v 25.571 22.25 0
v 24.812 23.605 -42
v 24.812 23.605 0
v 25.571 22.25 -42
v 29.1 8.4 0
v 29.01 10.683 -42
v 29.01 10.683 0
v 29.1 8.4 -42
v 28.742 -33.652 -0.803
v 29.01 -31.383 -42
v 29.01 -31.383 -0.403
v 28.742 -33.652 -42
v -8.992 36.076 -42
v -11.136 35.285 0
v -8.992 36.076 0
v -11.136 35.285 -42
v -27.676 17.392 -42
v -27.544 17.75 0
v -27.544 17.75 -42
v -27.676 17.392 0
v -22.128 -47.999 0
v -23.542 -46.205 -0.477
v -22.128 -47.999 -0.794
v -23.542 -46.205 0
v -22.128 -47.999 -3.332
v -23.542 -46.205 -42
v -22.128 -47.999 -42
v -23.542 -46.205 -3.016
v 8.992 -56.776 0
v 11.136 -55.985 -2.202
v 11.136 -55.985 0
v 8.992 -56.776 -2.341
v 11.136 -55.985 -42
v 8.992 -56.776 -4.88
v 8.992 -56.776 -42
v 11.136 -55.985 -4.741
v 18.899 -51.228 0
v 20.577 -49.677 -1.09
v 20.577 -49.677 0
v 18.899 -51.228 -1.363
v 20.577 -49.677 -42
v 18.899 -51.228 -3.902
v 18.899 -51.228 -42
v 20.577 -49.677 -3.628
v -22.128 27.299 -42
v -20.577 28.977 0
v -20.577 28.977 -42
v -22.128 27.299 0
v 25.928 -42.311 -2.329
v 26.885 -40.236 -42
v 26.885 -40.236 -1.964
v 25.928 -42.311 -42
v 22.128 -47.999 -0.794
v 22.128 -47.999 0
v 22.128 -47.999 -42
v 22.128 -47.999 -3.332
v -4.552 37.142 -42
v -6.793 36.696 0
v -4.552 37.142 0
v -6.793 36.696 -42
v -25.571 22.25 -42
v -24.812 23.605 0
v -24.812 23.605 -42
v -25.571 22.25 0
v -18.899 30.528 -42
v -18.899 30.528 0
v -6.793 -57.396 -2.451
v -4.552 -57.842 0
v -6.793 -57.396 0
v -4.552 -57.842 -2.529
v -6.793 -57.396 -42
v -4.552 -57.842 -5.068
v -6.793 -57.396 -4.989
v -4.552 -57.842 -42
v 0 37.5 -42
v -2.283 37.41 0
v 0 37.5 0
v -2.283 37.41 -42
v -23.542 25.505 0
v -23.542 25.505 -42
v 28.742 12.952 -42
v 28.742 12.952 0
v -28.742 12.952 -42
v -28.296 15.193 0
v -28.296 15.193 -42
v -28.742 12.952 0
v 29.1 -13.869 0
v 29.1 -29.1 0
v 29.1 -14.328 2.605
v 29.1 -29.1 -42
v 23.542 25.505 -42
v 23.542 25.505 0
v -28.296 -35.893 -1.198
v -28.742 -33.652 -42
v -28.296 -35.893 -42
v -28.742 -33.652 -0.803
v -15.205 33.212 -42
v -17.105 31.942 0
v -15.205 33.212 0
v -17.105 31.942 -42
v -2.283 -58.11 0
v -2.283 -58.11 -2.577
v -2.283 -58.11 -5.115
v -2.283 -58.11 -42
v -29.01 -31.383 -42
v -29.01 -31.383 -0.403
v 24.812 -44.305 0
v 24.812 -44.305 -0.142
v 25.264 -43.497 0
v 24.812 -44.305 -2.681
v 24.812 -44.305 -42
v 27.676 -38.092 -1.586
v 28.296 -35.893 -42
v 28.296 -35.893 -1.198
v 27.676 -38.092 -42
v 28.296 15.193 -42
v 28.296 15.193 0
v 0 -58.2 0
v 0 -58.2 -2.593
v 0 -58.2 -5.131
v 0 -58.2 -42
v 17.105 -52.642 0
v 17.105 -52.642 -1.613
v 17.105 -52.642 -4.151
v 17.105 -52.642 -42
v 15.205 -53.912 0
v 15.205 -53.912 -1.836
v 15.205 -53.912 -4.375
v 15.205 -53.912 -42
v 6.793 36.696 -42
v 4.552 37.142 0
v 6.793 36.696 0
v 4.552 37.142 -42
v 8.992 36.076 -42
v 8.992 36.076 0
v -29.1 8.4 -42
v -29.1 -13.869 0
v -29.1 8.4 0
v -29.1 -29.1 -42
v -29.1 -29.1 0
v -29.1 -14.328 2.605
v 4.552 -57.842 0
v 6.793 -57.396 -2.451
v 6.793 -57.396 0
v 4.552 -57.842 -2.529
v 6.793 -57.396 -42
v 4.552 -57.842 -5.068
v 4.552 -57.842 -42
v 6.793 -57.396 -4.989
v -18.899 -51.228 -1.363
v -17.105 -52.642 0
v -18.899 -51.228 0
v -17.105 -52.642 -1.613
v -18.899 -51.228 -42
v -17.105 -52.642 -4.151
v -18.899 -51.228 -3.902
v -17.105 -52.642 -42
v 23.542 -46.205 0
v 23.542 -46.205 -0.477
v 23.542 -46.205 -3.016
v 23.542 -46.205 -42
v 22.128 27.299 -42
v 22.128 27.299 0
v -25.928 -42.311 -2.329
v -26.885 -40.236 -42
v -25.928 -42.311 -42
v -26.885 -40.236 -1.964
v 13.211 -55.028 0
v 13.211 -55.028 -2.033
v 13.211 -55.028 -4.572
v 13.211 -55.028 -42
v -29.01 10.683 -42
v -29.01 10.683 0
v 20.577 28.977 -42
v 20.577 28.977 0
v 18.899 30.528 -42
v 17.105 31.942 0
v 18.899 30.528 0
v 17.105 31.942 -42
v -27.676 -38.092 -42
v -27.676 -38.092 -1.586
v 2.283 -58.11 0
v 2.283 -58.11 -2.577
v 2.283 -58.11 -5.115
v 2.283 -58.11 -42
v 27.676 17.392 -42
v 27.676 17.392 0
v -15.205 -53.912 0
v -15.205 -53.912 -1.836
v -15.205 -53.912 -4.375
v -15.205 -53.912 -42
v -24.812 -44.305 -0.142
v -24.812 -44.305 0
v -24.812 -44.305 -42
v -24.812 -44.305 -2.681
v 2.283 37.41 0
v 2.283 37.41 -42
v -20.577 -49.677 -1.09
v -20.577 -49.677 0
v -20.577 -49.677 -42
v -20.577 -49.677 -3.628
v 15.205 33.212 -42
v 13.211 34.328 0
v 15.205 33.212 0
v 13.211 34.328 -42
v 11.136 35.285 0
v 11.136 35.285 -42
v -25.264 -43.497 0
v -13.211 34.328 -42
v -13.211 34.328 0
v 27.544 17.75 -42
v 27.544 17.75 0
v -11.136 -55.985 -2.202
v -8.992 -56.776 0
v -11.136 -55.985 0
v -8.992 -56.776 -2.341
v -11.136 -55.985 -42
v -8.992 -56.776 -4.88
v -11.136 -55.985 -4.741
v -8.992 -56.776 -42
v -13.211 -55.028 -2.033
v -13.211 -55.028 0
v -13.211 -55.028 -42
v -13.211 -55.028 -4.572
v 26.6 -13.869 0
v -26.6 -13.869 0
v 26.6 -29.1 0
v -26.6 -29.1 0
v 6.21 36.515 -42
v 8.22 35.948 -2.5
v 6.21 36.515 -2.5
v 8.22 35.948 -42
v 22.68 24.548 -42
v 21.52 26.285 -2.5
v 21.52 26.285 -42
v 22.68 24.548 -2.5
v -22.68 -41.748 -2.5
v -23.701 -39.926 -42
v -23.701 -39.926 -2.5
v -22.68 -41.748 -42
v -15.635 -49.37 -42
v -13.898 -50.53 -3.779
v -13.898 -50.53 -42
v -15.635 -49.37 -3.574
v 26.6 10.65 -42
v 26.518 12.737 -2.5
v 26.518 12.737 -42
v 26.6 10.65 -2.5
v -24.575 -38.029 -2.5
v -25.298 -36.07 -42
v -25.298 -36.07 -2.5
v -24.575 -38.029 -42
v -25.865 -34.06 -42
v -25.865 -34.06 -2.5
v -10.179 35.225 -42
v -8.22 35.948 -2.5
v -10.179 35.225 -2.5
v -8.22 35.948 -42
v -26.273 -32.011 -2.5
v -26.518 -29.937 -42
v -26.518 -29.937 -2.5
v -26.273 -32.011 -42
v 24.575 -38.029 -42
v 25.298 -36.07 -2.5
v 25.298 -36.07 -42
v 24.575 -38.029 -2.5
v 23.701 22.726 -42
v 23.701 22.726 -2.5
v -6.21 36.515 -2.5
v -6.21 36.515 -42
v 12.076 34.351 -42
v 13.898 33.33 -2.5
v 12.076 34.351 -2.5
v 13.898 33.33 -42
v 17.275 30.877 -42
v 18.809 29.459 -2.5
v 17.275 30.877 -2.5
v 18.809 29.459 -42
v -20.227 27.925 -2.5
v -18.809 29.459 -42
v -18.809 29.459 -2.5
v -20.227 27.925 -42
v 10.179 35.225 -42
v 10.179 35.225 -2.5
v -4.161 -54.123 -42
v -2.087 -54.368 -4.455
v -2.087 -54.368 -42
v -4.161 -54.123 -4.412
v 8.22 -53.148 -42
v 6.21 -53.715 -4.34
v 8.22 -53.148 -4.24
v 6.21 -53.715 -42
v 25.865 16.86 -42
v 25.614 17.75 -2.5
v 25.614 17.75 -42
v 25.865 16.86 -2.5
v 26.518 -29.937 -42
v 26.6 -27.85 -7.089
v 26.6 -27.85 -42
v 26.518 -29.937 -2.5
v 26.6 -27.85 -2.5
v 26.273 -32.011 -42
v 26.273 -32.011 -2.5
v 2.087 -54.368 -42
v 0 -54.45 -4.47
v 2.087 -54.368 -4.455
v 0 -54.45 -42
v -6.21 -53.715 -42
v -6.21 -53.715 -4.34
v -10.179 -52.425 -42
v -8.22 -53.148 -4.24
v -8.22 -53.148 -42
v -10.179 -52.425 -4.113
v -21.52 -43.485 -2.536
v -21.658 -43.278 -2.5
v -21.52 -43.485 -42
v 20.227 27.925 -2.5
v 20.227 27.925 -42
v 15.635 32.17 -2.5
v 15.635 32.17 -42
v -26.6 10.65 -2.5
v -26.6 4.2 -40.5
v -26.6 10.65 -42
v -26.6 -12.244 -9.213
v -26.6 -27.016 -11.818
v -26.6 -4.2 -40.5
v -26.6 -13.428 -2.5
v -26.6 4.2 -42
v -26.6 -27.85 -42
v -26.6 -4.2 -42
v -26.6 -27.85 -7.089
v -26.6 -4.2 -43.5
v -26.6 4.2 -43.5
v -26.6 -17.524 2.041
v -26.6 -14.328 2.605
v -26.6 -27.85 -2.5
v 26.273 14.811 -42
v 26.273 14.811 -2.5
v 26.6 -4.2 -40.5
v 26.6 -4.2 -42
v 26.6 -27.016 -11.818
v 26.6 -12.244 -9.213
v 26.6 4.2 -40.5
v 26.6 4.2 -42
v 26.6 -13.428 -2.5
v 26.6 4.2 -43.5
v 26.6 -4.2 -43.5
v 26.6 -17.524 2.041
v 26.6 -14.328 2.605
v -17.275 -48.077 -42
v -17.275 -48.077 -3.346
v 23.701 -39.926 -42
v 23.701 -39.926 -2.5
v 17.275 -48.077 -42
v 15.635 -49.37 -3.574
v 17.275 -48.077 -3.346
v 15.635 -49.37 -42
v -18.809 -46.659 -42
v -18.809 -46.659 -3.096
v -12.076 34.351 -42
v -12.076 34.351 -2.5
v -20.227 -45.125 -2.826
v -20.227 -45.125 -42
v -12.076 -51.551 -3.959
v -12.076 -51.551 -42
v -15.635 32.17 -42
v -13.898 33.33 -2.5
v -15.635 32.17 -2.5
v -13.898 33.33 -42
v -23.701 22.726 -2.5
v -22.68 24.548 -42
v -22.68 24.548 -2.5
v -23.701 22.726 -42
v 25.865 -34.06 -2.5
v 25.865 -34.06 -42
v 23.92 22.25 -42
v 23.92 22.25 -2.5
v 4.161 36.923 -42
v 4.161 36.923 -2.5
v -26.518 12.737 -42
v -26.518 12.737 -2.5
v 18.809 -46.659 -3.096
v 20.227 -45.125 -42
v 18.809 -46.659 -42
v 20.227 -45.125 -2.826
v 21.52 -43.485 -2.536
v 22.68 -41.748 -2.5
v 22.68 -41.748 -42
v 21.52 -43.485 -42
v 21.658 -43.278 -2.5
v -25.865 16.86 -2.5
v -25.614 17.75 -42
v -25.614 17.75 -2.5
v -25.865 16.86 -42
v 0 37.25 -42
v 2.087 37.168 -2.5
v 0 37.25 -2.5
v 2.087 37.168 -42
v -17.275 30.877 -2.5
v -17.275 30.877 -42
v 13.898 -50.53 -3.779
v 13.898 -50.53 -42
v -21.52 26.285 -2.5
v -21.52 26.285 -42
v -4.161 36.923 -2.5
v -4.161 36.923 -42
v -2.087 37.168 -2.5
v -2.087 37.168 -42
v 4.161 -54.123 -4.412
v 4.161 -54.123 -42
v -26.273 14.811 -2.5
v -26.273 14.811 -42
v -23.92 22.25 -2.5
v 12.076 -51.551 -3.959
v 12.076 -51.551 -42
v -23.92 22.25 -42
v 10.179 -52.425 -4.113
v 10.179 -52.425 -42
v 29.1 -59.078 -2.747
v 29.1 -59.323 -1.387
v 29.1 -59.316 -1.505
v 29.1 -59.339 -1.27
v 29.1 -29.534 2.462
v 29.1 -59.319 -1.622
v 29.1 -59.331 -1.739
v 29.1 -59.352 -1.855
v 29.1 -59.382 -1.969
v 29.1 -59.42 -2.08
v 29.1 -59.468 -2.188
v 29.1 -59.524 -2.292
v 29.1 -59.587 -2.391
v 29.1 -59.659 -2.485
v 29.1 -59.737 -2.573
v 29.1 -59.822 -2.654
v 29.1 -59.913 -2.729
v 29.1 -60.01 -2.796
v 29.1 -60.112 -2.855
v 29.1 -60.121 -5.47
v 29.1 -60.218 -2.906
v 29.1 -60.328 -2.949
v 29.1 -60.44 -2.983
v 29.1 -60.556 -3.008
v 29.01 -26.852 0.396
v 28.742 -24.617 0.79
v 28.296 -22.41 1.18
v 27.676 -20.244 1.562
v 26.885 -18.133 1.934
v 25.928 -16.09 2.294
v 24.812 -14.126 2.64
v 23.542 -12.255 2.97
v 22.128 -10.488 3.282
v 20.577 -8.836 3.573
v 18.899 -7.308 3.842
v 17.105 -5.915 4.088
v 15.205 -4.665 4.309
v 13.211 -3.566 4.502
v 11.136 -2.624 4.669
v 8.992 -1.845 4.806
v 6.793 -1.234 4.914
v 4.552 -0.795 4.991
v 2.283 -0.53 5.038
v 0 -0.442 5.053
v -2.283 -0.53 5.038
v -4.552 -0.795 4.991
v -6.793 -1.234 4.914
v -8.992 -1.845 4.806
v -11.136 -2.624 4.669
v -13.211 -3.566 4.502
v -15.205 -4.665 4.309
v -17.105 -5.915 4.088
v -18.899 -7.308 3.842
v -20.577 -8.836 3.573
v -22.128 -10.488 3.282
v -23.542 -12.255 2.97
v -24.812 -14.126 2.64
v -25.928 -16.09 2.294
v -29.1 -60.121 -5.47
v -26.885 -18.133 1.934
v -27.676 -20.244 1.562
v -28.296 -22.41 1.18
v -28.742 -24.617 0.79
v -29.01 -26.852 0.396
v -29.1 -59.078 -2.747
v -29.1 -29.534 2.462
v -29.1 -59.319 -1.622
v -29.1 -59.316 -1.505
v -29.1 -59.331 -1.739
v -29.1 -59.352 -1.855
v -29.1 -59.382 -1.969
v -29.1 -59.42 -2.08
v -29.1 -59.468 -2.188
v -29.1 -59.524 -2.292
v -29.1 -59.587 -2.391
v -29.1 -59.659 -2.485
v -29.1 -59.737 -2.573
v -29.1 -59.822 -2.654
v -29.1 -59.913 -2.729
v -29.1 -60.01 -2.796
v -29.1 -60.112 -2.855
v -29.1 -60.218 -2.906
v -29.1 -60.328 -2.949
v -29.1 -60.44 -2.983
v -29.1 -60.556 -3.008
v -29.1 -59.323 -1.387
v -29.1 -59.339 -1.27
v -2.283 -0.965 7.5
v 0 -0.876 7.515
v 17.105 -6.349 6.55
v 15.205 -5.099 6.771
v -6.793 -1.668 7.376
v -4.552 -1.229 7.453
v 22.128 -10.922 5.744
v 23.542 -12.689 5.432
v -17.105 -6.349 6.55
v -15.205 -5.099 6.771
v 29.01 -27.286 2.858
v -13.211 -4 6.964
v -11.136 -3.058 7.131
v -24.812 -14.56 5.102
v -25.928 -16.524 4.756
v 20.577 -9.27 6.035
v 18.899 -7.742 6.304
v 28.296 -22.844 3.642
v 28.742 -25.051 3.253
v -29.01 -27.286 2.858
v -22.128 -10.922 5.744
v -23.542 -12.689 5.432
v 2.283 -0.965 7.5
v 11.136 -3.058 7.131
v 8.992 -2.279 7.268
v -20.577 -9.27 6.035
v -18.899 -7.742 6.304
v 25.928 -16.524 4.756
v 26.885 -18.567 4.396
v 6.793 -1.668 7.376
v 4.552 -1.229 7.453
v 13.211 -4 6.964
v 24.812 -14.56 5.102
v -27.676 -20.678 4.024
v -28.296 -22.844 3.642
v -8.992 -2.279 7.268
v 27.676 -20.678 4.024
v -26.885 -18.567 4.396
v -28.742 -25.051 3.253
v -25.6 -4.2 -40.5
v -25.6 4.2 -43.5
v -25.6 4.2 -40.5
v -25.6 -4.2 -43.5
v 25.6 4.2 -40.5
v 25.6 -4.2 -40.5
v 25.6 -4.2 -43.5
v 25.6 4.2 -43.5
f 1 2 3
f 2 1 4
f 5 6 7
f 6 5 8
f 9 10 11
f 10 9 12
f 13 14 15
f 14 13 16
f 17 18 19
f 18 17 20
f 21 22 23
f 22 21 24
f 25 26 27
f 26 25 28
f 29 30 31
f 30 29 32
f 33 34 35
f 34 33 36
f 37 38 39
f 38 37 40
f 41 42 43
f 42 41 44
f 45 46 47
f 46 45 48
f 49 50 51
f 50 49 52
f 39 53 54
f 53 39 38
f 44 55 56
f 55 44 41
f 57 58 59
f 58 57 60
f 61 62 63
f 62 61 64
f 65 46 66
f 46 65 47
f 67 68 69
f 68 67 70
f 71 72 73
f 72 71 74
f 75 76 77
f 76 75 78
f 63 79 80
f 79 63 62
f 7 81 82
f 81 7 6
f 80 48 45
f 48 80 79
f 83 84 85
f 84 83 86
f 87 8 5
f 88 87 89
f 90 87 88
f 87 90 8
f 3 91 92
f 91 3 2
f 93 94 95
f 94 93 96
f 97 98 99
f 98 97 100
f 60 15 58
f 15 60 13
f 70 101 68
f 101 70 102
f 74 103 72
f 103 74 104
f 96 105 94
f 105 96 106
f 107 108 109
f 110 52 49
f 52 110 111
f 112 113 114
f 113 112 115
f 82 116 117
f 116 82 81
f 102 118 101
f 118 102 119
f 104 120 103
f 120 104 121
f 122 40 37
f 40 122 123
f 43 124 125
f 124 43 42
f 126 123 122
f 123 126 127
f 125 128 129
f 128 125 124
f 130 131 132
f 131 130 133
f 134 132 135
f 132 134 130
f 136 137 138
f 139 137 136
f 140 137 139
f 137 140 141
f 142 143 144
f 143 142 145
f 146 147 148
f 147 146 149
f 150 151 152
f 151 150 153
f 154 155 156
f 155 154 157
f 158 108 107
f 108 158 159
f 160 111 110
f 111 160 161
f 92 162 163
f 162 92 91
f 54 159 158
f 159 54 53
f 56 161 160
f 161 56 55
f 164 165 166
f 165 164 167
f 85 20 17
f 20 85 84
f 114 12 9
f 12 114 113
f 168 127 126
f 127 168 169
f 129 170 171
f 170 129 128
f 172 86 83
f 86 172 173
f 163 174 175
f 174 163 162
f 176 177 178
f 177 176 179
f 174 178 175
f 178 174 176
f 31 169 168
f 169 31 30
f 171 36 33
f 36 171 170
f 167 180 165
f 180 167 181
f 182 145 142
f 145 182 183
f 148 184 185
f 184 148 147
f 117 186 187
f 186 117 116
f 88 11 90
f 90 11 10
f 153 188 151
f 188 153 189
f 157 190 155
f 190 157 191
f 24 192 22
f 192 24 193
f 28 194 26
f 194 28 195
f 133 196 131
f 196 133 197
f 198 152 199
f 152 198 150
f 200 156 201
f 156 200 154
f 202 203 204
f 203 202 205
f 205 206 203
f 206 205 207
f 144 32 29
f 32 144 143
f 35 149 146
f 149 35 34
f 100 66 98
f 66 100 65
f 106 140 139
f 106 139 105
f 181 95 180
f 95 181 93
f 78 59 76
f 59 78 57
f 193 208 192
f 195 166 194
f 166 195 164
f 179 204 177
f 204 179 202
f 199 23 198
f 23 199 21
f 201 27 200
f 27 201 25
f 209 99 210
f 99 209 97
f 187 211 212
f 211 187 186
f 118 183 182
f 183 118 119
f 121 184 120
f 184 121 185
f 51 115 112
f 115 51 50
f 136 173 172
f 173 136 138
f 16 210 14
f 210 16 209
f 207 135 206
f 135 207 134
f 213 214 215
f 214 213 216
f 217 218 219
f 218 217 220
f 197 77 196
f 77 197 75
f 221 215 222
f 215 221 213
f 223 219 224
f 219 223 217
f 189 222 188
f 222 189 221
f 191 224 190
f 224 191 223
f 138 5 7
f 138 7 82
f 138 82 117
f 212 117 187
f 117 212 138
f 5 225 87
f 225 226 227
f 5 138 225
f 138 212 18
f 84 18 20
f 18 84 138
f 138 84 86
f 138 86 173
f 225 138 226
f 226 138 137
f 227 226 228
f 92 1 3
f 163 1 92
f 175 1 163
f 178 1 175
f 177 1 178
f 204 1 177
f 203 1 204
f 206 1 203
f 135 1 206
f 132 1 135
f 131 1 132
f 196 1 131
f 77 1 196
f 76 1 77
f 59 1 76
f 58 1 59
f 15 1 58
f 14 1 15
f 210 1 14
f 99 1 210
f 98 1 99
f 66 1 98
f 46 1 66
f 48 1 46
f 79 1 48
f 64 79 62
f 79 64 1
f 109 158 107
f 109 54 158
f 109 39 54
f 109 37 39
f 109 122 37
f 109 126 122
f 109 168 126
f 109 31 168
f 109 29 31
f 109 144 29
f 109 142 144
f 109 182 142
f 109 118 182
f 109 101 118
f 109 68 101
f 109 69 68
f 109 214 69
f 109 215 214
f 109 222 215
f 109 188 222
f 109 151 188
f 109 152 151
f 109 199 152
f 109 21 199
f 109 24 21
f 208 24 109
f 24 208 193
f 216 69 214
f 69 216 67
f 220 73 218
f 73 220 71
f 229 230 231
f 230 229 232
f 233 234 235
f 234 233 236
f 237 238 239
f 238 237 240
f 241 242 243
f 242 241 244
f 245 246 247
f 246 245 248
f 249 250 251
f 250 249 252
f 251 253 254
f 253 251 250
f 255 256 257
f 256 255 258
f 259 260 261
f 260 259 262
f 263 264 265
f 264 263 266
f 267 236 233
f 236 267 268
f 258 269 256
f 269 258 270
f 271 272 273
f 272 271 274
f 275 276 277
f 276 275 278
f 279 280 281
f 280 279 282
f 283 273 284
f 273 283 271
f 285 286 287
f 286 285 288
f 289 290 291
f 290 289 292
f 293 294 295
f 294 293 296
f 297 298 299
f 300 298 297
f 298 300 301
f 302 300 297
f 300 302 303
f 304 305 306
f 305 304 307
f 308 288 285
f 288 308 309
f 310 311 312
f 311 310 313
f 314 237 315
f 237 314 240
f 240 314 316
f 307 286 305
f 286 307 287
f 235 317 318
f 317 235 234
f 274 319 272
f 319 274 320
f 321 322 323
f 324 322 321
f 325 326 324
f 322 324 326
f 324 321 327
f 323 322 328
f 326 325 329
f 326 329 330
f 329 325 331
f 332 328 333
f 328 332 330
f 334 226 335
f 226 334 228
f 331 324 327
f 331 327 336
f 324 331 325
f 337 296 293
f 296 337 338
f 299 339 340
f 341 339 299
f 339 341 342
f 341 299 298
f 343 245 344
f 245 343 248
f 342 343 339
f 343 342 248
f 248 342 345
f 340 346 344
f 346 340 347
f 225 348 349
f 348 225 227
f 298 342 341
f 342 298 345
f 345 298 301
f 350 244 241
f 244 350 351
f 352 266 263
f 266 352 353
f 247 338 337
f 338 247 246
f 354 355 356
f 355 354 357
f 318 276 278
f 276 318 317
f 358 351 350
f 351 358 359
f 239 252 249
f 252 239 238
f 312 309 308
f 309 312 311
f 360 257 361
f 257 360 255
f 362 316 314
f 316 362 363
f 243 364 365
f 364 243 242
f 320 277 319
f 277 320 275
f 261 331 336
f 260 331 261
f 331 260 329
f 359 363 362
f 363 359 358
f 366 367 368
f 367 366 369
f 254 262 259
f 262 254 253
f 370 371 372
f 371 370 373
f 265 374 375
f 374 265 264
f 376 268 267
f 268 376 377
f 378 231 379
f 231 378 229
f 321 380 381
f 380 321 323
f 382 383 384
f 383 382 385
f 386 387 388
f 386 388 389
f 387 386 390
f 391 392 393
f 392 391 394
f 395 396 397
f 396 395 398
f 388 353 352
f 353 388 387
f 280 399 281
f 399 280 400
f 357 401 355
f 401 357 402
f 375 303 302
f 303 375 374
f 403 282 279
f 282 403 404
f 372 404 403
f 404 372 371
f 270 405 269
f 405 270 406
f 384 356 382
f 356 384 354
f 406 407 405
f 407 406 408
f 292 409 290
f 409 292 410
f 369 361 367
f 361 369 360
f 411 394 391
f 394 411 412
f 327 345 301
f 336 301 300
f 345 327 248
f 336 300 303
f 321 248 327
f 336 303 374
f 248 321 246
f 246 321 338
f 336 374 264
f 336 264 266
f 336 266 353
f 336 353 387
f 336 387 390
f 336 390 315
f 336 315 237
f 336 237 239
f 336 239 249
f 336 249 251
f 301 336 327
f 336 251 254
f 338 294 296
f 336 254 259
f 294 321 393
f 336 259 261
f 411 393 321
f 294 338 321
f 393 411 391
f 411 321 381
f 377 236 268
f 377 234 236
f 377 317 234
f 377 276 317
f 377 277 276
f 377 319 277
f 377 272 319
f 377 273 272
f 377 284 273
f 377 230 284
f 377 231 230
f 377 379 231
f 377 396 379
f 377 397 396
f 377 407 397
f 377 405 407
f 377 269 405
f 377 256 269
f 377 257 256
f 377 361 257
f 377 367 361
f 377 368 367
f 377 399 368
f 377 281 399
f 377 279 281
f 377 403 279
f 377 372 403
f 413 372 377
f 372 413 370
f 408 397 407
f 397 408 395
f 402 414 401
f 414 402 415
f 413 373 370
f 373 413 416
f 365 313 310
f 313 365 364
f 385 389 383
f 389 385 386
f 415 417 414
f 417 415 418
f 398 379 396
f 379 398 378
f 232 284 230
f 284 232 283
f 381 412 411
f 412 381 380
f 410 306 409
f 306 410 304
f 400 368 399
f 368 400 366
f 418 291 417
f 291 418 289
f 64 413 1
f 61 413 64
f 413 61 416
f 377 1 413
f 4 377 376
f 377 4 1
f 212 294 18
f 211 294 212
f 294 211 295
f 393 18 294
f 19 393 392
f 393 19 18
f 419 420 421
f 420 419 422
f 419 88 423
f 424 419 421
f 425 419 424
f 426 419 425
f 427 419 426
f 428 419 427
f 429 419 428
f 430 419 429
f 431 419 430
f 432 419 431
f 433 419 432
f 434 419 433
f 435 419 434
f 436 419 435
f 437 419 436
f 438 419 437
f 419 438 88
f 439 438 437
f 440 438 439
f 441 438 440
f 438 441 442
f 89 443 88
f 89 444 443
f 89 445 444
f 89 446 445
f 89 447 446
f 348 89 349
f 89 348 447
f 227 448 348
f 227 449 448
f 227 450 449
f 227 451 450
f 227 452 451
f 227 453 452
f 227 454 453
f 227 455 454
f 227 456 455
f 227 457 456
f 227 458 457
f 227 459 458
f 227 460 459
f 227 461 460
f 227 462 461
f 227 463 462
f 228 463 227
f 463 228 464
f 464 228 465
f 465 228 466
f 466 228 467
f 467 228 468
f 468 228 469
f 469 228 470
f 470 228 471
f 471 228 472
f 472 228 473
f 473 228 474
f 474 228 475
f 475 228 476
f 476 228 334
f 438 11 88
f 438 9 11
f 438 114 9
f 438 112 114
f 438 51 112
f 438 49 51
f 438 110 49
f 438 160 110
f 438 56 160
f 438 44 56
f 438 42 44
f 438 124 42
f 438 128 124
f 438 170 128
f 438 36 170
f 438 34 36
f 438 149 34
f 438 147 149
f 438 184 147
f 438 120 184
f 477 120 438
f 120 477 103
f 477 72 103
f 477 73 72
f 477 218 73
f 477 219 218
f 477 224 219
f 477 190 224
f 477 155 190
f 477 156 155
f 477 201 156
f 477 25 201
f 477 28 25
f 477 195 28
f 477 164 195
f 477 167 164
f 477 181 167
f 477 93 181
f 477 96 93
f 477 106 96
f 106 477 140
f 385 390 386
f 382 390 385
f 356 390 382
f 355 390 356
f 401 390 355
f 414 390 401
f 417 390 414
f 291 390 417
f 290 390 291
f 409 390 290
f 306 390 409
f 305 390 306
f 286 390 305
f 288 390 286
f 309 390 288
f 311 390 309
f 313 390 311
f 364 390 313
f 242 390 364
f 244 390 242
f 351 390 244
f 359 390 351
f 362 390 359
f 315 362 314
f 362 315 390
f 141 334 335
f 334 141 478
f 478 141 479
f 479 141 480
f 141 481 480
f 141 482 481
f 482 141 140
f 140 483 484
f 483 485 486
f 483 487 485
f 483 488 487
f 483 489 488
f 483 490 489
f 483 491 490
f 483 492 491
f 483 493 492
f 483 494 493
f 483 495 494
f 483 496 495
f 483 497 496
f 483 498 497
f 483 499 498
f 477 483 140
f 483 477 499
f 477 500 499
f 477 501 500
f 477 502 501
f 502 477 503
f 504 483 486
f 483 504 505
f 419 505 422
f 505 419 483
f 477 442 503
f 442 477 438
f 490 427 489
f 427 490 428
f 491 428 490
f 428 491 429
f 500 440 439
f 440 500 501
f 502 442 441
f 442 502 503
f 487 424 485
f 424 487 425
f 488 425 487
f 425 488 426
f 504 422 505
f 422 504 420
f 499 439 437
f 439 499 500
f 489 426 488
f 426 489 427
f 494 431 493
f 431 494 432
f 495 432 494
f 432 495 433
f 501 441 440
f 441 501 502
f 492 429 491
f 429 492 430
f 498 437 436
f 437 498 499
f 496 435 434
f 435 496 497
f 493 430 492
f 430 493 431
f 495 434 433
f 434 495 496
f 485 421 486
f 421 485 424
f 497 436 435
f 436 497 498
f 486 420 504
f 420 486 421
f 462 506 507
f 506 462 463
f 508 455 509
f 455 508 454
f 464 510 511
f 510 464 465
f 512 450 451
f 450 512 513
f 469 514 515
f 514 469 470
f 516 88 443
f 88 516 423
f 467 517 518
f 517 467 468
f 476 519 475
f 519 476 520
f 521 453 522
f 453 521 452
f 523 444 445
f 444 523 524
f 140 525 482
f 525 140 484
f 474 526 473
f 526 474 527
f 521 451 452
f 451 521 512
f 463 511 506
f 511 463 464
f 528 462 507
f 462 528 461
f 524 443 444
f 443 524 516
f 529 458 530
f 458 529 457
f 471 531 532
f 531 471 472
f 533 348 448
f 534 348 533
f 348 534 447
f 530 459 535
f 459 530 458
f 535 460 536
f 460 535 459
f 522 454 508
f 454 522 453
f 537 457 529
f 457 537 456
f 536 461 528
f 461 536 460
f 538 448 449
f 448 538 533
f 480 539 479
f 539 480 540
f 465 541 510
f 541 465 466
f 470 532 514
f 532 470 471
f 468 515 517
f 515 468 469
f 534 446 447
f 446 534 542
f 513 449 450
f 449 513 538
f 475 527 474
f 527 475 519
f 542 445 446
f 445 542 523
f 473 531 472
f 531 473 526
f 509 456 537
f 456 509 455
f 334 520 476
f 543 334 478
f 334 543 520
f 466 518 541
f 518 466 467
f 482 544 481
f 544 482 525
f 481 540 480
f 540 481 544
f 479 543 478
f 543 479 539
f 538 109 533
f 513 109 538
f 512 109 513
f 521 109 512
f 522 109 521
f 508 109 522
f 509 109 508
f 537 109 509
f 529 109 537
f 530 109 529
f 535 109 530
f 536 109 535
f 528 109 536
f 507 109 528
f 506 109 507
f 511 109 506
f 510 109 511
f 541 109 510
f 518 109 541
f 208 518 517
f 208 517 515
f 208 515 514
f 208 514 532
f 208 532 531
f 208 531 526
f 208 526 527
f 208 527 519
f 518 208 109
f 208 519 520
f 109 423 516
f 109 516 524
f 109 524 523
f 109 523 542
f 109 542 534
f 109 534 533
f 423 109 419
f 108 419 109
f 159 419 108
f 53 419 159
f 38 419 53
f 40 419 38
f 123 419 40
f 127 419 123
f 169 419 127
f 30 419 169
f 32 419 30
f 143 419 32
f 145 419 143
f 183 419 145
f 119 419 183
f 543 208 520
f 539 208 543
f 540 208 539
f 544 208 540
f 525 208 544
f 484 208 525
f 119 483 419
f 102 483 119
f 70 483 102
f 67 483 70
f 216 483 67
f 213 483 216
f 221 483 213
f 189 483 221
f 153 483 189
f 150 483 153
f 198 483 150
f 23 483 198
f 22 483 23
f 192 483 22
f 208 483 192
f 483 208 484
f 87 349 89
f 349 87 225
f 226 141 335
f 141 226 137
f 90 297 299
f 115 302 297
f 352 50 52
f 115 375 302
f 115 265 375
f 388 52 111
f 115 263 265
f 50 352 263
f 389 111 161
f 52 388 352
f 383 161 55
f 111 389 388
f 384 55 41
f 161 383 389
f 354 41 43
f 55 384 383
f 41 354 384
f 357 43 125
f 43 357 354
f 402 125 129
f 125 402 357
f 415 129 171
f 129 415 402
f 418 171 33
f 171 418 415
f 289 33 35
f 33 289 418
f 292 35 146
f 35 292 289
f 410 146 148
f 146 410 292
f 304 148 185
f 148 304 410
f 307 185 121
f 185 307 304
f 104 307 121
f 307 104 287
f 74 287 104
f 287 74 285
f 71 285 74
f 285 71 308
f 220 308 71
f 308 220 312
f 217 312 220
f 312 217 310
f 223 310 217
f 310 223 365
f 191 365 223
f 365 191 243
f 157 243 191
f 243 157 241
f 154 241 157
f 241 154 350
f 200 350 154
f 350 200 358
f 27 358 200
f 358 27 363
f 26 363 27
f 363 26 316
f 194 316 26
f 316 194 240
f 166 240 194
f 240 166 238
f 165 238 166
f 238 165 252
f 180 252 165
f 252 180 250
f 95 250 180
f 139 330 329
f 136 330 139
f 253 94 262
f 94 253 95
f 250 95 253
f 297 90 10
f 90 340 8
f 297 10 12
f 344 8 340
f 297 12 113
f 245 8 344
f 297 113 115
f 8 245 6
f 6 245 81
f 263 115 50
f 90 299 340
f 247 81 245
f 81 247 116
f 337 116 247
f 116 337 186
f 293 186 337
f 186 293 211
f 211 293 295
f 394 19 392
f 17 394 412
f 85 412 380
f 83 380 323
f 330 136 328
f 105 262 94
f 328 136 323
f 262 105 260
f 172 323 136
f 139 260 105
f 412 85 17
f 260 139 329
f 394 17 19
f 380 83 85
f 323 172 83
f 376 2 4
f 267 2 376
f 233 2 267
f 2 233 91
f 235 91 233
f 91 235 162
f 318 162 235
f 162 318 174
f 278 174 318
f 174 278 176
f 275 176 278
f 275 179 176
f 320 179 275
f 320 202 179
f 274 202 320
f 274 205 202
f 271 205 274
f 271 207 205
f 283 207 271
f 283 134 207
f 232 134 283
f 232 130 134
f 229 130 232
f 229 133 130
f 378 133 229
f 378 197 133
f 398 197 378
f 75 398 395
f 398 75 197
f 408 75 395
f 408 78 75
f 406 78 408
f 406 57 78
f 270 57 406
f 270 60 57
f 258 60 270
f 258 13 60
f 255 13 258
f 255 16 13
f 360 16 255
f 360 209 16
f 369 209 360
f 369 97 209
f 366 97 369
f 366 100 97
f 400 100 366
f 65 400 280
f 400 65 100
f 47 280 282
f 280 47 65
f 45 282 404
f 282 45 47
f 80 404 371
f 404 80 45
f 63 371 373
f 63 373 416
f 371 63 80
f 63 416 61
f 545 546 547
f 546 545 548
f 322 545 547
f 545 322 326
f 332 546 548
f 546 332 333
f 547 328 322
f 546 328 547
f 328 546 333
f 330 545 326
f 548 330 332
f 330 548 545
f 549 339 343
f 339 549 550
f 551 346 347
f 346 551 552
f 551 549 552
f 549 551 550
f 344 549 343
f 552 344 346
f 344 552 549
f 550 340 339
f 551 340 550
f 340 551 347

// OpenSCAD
// ============================================================
// Arlo Pro 5S (VMC4060P) Rain & Sun Hood
// ============================================================
// A clip-on hood that follows the rounded contours of the Arlo
// Pro 5S camera body. The camera has a pill/capsule shape with
// heavily rounded vertical edges. This hood hugs that shape to
// deflect rain and block direct sunlight from the lens.
//
// Camera dimensions: 89mm H x 52mm W x 78.4mm D
// The body is a rounded rectangle — nearly a vertical capsule.
// ============================================================

$fn = 80;

// --- Camera body dimensions (Arlo Pro 5S) ---
cam_width    = 52;    // mm, side to side
cam_height   = 89;    // mm, top to bottom
cam_depth    = 78.4;  // mm, front to back
cam_corner_r = 26;    // mm, vertical edge radius (half width = capsule)

// --- Hood parameters ---
wall         = 2.5;   // mm, hood shell thickness
clearance    = 0.6;   // mm, gap between hood and camera body
hood_wrap    = 42;    // mm, how far down the sides the hood extends
hood_back    = 35;    // mm, how far back the hood extends on the body
visor_ext    = 30;    // mm, how far the visor projects forward
visor_angle  = 10;    // degrees, downward tilt for water runoff
drip_edge    = 1.5;   // mm, raised rim at visor tip
lip_height   = 3;     // mm, inner retention lip depth
lip_inset    = 1.0;   // mm, retention lip thickness

// --- Derived ---
inner_r = cam_corner_r + clearance;
outer_r = inner_r + wall;
inner_w = cam_width + clearance * 2;
outer_w = inner_w + wall * 2;

// ============================================================
// Main Assembly
// ============================================================
hood();

// ============================================================
// Modules
// ============================================================

module hood() {
    difference() {
        union() {
            contour_shell();
            visor();
        }
        // Trim everything below the hood wrap line
        translate([0, 0, -(hood_wrap + 50)])
            cube([200, 200, 100], center = true);
    }
    retention_lips();
}

// Shell that follows the camera's rounded-rectangle cross-section
module contour_shell() {
    difference() {
        // Outer shape
        camera_shape(outer_w, hood_back + wall, hood_wrap + wall, outer_r);
        // Inner cavity
        translate([0, -wall/2, -wall])
            camera_shape(inner_w, hood_back + wall + 1, hood_wrap + 1, inner_r);
        // Open the back
        translate([0, hood_back/2 + wall, 0])
            cube([outer_w + 2, wall + 2, (hood_wrap + wall) * 2 + 2], center = true);
    }
}

// Camera body profile: a rounded rectangle extruded vertically,
// centered on X, extending rearward on +Y, downward on -Z.
// This is the fundamental contour both inner and outer shells share.
module camera_shape(w, d, h, r) {
    clamp_r = min(r, w / 2);
    translate([0, 0, -h]) {
        hull() {
            // Front-left
            translate([-(w/2 - clamp_r), -clamp_r, 0])
                cylinder(r = clamp_r, h = h);
            // Front-right
            translate([(w/2 - clamp_r), -clamp_r, 0])
                cylinder(r = clamp_r, h = h);
            // Back-left
            translate([-(w/2 - clamp_r), d - clamp_r, 0])
                cylinder(r = clamp_r, h = h);
            // Back-right
            translate([(w/2 - clamp_r), d - clamp_r, 0])
                cylinder(r = clamp_r, h = h);
        }
    }
}

// Visor follows the curved front of the camera body and extends forward
module visor() {
    clamp_r = min(outer_r, outer_w / 2);
    translate([0, -(clamp_r), 0])
    rotate([visor_angle, 0, 0]) {
        // Curved visor plate: hull between the front edge arc and the tip
        hull() {
            // Arc along the front of the camera — matches the shell curvature
            front_arc(outer_w, outer_r, wall);
            // Visor tip — a thin bar extended forward
            translate([0, -visor_ext, 0])
                front_bar(outer_w, wall);
        }
        // Drip edge at visor tip
        translate([0, -visor_ext, 0])
            drip_rim(outer_w, drip_edge, wall);
        // Side flanges for rigidity
        visor_side_flange(outer_w / 2 - wall, visor_ext);
        visor_side_flange(-(outer_w / 2), visor_ext);
    }
}

// Arc shape matching the front curve of the camera body
module front_arc(w, r, thickness) {
    clamp_r = min(r, w / 2);
    hull() {
        translate([-(w/2 - clamp_r), 0, 0])
            cylinder(r = clamp_r, h = thickness);
        translate([(w/2 - clamp_r), 0, 0])
            cylinder(r = clamp_r, h = thickness);
    }
}

// Simple flat bar for the visor tip
module front_bar(w, thickness) {
    translate([-(w / 2), 0, 0])
        cube([w, 0.1, thickness]);
}

// Drip edge: raised rim along the visor front
module drip_rim(w, edge_h, thickness) {
    difference() {
        translate([-(w / 2), -edge_h, 0])
            cube([w, edge_h, thickness + edge_h]);
        // Round the outer edge
        translate([-(w / 2 + 1), -edge_h, thickness + edge_h])
            rotate([0, 90, 0])
                cylinder(r = edge_h, h = w + 2);
    }
}

// Triangular side flange connecting visor to shell
module visor_side_flange(x_pos, length) {
    translate([x_pos, 0, -12]) {
        cube([wall, length * 0.5, 12]);
    }
}

// Retention lips on the inside at the bottom of the shell
module retention_lips() {
    clamp_r = min(inner_r, inner_w / 2);
    for (side = [-1, 1]) {
        translate([side * (inner_w / 2 - lip_inset / 2), 0, -hood_wrap])
            cube([lip_inset, hood_back - clamp_r, lip_height], center = true);
    }
}
